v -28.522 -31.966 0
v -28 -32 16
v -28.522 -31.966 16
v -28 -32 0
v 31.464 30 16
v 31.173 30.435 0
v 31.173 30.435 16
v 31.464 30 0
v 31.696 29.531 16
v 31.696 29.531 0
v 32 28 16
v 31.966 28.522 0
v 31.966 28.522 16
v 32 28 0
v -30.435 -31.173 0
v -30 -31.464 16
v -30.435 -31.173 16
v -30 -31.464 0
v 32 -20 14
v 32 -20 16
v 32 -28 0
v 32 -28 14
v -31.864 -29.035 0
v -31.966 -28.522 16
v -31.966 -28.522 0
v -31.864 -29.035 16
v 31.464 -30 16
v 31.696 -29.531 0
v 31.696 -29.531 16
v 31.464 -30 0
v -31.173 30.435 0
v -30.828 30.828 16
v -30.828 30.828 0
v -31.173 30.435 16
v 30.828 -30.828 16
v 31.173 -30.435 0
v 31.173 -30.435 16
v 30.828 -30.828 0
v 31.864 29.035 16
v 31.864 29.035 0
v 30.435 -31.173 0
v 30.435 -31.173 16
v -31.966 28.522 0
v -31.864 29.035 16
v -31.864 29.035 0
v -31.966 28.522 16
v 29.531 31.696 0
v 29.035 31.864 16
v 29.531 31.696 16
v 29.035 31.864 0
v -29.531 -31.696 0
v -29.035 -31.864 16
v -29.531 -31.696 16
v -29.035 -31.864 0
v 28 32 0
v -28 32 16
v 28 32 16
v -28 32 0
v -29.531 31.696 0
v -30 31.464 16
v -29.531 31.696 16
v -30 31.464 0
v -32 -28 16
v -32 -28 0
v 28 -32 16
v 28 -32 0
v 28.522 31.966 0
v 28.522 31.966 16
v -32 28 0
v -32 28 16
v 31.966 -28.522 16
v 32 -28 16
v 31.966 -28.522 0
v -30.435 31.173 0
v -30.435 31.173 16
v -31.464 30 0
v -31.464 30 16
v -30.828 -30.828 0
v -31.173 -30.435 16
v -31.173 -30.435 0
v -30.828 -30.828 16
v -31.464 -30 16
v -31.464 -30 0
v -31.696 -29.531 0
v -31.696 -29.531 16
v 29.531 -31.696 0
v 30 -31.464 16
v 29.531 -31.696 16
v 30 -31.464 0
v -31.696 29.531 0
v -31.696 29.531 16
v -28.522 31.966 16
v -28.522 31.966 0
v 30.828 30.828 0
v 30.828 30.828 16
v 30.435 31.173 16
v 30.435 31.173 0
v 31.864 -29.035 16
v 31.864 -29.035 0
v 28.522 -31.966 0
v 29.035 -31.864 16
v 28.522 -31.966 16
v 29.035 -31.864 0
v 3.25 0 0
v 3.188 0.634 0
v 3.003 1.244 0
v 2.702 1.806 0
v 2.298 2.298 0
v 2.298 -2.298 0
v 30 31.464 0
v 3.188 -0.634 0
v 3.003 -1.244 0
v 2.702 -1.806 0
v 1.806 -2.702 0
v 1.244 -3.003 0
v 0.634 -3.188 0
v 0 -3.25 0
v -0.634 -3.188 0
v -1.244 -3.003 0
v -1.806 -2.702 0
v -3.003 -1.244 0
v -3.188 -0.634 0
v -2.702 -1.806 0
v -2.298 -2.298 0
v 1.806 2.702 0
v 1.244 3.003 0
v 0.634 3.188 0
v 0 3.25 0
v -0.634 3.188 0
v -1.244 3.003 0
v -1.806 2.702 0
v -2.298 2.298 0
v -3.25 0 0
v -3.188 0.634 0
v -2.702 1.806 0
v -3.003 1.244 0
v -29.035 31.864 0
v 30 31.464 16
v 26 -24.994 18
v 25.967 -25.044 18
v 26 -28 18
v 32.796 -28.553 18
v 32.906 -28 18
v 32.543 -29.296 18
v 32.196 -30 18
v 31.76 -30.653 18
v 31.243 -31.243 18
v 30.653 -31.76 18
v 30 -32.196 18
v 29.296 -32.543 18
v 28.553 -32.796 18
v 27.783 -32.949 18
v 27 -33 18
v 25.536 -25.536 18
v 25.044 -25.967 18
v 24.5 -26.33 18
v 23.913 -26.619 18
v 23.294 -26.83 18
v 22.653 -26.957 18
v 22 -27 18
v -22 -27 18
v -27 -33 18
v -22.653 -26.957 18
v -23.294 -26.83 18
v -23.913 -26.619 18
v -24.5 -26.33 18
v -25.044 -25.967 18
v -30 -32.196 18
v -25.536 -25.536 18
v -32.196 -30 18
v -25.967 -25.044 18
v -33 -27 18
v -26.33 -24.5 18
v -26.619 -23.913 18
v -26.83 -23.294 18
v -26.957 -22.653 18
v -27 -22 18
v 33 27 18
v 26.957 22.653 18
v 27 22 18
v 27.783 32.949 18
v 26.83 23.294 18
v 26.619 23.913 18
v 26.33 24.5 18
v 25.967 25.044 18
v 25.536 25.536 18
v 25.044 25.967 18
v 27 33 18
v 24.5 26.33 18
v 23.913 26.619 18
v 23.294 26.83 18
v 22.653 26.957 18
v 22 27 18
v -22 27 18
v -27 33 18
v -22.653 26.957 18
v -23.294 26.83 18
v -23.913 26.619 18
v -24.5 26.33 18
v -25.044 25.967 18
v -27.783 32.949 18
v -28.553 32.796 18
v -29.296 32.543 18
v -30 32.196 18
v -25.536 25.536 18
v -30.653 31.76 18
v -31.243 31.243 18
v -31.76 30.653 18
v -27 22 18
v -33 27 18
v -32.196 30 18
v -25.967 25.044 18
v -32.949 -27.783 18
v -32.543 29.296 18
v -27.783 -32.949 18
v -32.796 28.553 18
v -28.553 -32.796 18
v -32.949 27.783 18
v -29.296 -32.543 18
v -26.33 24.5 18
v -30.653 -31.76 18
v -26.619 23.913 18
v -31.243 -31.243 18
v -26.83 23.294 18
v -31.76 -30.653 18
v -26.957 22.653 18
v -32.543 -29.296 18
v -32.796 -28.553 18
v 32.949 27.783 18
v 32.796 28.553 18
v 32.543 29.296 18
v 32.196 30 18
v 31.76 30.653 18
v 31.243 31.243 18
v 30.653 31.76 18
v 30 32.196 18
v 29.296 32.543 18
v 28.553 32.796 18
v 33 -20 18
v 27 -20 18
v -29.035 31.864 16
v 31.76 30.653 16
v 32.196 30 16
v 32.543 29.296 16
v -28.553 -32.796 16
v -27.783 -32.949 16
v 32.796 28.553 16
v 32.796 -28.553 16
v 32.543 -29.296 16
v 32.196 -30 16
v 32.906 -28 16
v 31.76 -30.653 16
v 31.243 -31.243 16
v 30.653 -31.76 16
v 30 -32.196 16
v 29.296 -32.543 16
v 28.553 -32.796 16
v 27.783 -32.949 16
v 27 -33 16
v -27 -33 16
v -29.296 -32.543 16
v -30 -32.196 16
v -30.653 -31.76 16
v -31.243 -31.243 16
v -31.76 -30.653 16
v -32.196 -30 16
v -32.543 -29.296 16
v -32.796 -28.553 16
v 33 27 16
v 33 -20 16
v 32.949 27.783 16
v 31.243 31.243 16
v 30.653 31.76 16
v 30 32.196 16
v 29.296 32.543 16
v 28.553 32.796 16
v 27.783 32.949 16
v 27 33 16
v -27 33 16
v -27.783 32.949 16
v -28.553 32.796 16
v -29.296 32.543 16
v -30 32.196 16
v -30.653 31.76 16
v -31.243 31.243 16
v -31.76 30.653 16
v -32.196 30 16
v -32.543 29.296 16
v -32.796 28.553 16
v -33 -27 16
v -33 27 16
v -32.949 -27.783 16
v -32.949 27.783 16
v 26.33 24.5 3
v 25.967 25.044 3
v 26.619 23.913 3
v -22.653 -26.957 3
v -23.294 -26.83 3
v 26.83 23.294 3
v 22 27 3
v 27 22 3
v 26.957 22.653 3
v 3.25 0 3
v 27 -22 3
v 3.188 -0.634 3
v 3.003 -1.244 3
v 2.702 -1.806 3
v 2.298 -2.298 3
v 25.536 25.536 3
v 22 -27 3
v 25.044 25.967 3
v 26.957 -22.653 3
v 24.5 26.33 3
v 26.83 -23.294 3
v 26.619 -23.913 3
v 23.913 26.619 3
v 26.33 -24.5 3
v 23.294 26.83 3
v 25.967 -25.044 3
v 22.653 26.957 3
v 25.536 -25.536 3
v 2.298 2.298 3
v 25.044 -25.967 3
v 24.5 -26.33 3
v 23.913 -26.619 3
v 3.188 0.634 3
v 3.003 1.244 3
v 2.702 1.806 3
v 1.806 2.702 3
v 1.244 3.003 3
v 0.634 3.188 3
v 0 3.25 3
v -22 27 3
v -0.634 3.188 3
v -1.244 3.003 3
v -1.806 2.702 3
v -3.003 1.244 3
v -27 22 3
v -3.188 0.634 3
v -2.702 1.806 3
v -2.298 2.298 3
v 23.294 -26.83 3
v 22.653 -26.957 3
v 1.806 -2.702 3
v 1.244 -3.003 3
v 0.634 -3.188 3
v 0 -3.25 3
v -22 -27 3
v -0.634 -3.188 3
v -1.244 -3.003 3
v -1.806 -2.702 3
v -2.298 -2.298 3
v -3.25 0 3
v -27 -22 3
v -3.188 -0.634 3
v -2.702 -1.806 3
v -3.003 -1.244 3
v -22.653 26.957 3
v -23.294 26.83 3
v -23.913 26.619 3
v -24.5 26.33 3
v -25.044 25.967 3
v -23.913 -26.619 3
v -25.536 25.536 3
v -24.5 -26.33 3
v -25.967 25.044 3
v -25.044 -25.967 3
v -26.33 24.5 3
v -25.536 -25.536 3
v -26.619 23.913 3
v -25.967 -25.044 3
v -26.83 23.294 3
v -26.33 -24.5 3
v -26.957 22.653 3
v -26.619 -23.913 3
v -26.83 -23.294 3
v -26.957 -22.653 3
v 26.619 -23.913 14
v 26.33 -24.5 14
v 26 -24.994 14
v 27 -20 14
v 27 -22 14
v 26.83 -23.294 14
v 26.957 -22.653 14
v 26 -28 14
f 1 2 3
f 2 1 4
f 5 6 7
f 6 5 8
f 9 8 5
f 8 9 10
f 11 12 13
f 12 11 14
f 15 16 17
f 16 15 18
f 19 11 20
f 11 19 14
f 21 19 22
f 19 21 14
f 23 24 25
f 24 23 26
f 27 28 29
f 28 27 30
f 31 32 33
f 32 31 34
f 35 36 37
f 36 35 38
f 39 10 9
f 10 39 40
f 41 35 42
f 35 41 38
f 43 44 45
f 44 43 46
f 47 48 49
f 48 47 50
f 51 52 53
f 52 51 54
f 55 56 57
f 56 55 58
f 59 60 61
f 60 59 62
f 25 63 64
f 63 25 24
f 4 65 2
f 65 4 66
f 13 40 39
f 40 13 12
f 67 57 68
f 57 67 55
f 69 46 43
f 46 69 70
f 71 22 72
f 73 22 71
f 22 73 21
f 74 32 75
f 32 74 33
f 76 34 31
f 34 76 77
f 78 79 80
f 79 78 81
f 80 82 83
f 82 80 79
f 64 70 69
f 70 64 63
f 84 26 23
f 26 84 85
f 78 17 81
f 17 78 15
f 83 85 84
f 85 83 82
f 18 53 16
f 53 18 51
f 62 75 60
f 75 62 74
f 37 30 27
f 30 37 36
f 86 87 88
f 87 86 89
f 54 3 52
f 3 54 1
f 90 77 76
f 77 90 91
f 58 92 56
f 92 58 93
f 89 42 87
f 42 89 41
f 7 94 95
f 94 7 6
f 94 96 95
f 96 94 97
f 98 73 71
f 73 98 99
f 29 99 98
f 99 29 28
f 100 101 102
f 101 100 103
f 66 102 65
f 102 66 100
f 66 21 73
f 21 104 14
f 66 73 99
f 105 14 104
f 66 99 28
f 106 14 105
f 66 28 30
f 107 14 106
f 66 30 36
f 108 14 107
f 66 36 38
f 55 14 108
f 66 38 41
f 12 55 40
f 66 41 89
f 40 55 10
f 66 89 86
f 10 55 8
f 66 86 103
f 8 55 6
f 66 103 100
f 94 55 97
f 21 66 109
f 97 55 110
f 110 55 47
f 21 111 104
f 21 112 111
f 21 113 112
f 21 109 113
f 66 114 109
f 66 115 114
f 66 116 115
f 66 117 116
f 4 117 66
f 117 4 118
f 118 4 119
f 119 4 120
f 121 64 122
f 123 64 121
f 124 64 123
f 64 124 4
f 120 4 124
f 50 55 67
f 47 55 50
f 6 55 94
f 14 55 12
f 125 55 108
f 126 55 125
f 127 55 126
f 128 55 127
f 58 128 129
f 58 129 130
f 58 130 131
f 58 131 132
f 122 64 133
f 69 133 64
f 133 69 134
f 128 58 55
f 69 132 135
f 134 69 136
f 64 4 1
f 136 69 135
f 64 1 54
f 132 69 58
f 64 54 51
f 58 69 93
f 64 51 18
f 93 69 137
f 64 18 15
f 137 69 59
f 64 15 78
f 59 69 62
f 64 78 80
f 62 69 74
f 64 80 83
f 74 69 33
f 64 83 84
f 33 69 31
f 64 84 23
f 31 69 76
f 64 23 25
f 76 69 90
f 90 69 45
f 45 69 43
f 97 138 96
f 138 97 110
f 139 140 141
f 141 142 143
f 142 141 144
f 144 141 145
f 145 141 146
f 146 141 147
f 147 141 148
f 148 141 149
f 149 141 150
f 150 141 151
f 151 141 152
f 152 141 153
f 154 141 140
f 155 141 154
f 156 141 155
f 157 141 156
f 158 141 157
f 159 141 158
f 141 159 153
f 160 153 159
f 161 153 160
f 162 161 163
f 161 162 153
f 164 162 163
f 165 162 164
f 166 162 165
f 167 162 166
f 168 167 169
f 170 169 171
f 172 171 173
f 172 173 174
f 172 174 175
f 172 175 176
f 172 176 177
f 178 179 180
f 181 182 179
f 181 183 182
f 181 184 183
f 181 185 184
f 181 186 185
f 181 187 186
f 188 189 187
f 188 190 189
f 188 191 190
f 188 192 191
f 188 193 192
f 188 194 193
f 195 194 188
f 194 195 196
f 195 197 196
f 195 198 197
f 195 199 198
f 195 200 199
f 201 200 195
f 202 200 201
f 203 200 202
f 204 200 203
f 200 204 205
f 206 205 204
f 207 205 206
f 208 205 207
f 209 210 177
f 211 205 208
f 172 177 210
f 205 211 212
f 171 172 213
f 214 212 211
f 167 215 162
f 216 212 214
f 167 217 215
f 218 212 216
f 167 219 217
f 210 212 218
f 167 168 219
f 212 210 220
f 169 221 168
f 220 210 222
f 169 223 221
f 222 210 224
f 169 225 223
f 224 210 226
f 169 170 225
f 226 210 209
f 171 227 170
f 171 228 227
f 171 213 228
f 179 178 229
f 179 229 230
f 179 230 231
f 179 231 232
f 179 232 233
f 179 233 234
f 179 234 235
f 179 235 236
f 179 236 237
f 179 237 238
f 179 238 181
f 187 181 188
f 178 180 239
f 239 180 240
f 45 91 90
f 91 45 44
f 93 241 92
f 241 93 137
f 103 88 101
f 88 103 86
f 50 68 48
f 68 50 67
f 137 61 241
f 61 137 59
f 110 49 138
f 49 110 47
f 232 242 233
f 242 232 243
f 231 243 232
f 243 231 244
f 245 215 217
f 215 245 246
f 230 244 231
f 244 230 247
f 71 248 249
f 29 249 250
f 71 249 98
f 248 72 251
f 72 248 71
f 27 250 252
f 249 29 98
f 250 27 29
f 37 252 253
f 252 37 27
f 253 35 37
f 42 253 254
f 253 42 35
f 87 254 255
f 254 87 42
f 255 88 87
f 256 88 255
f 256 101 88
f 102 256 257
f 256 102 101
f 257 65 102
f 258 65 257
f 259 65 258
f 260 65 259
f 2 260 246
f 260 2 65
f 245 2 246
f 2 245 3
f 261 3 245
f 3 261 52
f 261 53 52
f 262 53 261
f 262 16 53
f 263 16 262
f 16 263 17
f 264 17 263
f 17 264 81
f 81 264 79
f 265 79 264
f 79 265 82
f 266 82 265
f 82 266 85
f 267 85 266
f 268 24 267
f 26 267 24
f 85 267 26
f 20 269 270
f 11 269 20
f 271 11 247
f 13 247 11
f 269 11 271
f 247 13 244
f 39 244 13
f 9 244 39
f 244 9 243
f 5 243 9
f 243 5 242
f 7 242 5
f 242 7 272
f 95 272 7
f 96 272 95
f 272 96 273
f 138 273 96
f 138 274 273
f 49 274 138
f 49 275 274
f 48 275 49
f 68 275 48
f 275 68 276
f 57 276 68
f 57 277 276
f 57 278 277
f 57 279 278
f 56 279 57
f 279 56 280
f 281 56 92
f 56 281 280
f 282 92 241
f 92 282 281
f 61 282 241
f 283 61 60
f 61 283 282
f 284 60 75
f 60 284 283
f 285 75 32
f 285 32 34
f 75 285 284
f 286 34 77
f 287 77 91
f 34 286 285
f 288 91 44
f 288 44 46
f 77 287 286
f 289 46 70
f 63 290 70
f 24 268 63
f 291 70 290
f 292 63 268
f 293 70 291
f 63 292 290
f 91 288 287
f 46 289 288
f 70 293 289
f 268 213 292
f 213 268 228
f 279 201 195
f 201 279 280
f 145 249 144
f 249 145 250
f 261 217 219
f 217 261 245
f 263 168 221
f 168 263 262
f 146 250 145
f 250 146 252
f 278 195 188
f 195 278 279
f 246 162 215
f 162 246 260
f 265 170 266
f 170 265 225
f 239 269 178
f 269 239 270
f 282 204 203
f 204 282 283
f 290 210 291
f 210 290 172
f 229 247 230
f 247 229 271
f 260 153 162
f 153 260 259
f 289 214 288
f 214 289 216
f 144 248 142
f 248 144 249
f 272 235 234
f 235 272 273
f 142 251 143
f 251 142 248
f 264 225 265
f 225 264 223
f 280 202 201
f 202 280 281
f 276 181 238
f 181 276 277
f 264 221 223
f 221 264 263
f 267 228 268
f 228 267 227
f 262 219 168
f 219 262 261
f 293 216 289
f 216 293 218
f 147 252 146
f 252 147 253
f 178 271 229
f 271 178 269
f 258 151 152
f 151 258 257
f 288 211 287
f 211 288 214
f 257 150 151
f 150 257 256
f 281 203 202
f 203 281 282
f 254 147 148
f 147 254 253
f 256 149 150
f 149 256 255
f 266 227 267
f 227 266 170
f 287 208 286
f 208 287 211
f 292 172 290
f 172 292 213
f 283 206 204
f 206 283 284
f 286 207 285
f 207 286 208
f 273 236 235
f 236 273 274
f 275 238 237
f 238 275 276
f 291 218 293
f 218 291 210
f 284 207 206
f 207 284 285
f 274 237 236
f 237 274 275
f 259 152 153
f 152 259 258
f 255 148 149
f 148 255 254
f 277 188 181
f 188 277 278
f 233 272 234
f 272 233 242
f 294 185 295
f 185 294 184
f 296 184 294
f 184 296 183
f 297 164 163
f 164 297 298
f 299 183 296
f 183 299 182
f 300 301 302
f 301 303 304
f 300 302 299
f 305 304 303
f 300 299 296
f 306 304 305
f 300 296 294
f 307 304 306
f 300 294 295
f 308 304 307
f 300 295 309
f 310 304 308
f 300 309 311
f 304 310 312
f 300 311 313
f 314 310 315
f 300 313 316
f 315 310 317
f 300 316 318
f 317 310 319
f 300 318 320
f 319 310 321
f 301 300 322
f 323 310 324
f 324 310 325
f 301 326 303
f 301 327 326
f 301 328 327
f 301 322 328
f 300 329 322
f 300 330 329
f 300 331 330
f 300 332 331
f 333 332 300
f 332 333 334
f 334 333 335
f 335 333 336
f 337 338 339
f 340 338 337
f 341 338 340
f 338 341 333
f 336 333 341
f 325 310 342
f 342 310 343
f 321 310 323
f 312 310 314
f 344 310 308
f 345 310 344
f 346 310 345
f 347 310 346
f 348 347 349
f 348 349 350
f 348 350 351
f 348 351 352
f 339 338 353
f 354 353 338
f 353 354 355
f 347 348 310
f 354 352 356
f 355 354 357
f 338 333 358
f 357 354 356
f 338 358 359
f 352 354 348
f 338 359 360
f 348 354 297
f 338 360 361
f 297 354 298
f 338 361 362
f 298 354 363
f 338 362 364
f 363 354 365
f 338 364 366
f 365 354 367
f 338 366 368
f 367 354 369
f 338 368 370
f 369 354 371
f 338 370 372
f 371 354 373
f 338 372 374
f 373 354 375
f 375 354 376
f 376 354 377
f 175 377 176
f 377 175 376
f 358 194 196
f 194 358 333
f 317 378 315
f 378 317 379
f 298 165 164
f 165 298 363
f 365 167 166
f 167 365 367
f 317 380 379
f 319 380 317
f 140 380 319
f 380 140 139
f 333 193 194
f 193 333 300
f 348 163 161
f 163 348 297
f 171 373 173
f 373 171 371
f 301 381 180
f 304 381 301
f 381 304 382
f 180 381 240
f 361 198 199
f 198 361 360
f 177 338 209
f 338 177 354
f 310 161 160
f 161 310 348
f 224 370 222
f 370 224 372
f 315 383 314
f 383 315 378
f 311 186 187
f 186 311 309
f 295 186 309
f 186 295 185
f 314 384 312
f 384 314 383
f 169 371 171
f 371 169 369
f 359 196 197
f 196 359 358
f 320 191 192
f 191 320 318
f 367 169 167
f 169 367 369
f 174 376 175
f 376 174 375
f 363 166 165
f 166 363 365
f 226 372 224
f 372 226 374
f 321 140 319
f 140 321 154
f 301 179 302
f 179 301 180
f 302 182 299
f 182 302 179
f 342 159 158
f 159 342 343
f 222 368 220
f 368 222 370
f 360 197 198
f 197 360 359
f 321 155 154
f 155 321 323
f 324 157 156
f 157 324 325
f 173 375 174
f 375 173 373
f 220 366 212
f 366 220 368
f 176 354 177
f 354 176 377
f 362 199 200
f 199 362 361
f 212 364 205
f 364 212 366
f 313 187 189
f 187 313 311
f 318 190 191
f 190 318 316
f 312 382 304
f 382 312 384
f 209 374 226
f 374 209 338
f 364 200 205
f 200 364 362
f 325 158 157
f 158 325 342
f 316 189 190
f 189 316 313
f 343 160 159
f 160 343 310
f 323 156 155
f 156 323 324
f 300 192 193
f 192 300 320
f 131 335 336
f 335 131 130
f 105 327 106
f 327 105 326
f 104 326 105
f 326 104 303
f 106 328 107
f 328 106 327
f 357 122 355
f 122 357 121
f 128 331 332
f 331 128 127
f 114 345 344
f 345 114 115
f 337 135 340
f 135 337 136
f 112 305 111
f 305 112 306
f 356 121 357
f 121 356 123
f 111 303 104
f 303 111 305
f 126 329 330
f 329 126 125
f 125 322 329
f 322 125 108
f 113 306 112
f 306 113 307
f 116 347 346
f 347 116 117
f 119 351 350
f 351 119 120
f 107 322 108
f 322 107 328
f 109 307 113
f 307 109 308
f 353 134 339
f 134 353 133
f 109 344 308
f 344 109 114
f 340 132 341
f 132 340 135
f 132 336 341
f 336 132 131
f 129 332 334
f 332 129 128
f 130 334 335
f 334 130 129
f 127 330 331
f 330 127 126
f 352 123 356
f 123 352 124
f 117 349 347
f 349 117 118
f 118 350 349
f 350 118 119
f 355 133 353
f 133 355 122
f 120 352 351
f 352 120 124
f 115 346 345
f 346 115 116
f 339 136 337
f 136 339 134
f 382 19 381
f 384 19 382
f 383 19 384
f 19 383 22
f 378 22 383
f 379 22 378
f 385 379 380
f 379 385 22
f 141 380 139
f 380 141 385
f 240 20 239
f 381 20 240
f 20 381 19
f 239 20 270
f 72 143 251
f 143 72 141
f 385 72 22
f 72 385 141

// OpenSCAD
// file: ../params.scad
// LEGACY OpenSCAD — not maintained. Edit design/bed_params.json + Fusion builder instead.

// --- Printer envelope (Bambu P2S) ---
build_max = 256;
print_margin = 4;
print_limit = build_max - print_margin;

// --- Cell grid ---
grid_n = 3;
cell_pitch = 76;
wall_t = 3;
well_open = 58;
flange_seat = 64;
cassette_h = 18;
port_d = 6.5;

// --- Deck structure ---
deck_top_t = 4;
cavity_h = 32; // tube routing under cell deck (not electronics bay)
deck_rim = 8;
corner_r = 6;

// --- 370 micro pump (Taobao kit / photo vs Arduino; see docs/HARDWARE_DIMENSIONS.md) ---
pump_motor_d = 24.5;
pump_head_d = 31;
pump_axis_l = 68;
pump_nozzle_h = 8;
pump_port_od = 4.2;
pump_wire_tail = 35;
pump_count = 8; // set 6–8; layout skips extras above pump_count
pump_rows = 2;
pump_cols = 4;
pump_col_pitch = 36; // center distance along X
pump_row_pitch = 38; // center distance along Y
pump_cradle_z = 2; // floor of cradle above tray surface

// --- Solenoid (kit) ---
valve_l = 22;
valve_w = 12;
valve_h = 30;
valve_count = grid_n * grid_n;

// --- Arduino Uno + sensor shield (kit photo) ---
ctrl_board_l = 69;
ctrl_board_w = 54;
arduino_l = ctrl_board_l;
arduino_w = ctrl_board_w;
arduino_stack_h = 28;
arduino_standoff_h = 6;
arduino_usb_slot_w = 14;
arduino_usb_slot_h = 8;

// --- Closed electronics bay (pumps + Arduino, under service deck) ---
e_bay_x = 200;
e_bay_y = 128;
e_bay_cavity_h = 52;
e_bay_split_x = 100; // optional left/right print split at this X (local)
e_bay_tray_t = 4;
e_bay_rim_h = 8;

// Pump block placement inside bay (local coords, center = origin)
pump_block_w = (pump_cols - 1) * pump_col_pitch + pump_axis_l;
pump_block_h = (pump_rows - 1) * pump_row_pitch + pump_head_d;
pump_block_x0 = -pump_block_w / 2 - 8;
pump_block_y0 = -8;
arduino_pocket_x = e_bay_x / 2 - deck_rim - ctrl_board_l / 2 - 6;
arduino_pocket_y = -e_bay_y / 2 + deck_rim + ctrl_board_w / 2 + 6;

wire_gutter_d = 10;

// --- Service module (solid deck above electronics bay) ---
service_len = e_bay_y + deck_rim * 2;
service_deck_solid = true;

// --- Bottom / screw housing ---
panel_t = 4;
panel_screw_d = 3.4;
panel_screw_pitch = 35;
flange_screw_pitch = 40;
boss_od = 8;
split_flange_t = 10;

// --- Tube routing (cell deck) ---
// Each cell: one tube at bottom-center of well (not visible from top).
tube_od = 6;
tube_clip_id = tube_od + 0.6;
channel_w = tube_od + 4;
channel_depth = 8;
stem_pocket_d = channel_w; // barb + bend relief under well floor
stem_pocket_h = channel_depth + 4;

// --- Joint between deck sections ---
dowel_d = 5;
dowel_depth = 10;
lap_joint_screw_d = 3.4;

slip_fit = 0.25;
eps = 0.01;

function grid_span(n, pitch) = (n - 1) * pitch;
grid_xy = grid_span(grid_n, cell_pitch) + well_open + deck_rim * 2;
deck_cell_x = grid_xy;
deck_cell_y = grid_xy;
deck_service_x = max(deck_cell_x, e_bay_x + deck_rim * 2);
deck_service_y = service_len;
// file: ../lib/util.scad
include <../params.scad>

module rounded_rect_xy(x, y, r) {
  r2 = min(r, x / 2 - eps, y / 2 - eps);
  minkowski() {
    square([x - 2 * r2, y - 2 * r2], center = true);
    circle(r = r2, $fn = 48);
  }
}

module rounded_rect_3d(x, y, z, r) {
  linear_extrude(height = z, center = false, convexity = 4)
    rounded_rect_xy(x, y, r);
}

module well_cut(open_size, depth) {
  linear_extrude(height = depth + eps)
    rounded_rect_xy(open_size, open_size, corner_r - 1);
}

module port_hole(d = port_d) {
  cylinder(h = deck_top_t + cavity_h + panel_t + 2, d = d, center = false, $fn = 32);
}

// Bottom-center of cell well: through 4 mm floor into routing cavity (hidden from top).
module cell_bottom_port() {
  translate([0, 0, -eps])
    cylinder(h = deck_top_t + eps, d = port_d, $fn = 32);
}

module cell_stem_pocket(h = stem_pocket_h, d = stem_pocket_d) {
  translate([0, 0, -deck_top_t])
    cylinder(h = h, d = d, $fn = 32);
}

// Horizontal groove under deck (−Y toward service bay), centered on cell X.
module cell_run_to_service(run_len) {
  if (run_len > 2)
    translate([0, -run_len / 2, -deck_top_t - channel_depth / 2])
      cube([channel_w, run_len, channel_depth], center = true);
}

function service_foot_y(deck_y) = -deck_y / 2 + deck_rim;

function cell_run_len(cell_y, deck_y) = cell_y - service_foot_y(deck_y);

module cell_underdeck_plumbing(cell_y, deck_y) {
  cell_bottom_port();
  cell_stem_pocket();
  cell_run_to_service(cell_run_len(cell_y, deck_y));
}

module dowel_hole(depth = dowel_depth) {
  cylinder(h = depth + eps, d = dowel_d + slip_fit, $fn = 32);
}

module dowel_pin(h = dowel_depth) {
  cylinder(h = h, d = dowel_d - 0.05, $fn = 32);
}

// Route from cell center toward service bay (-Y direction)
module tube_channel(length, w = channel_w, d = channel_depth) {
  translate([0, -length / 2, -d])
    cube([w, length, d], center = true);
}

module tube_clip_body() {
  clip_w = 12;
  clip_h = channel_depth + 4;
  difference() {
    rounded_rect_3d(clip_w, clip_w, clip_h, 2);
    translate([0, 0, 2])
      cylinder(h = clip_h, d = tube_clip_id, $fn = 32);
    // snap slot
    translate([clip_w / 2 - 1, 0, clip_h / 2])
      cube([2, clip_w, clip_h], center = true);
  }
}
// main file
// Export: cell_cassette.stl — print ×9, PETG, top surface down for smooth seat
include <../lib/util.scad>

module cell_cassette() {
  outer = flange_seat;
  inner = well_open - 4;
  wall = (outer - inner) / 2;

  difference() {
    union() {
      rounded_rect_3d(outer, outer, cassette_h, corner_r - 2);
      // clamp lip
      translate([0, 0, cassette_h - 2])
        rounded_rect_3d(outer + 2, outer + 2, 2, corner_r);
    }
    // bladder pocket
    translate([0, 0, 3])
      well_cut(inner, cassette_h + eps);
    // bottom-center barb (mates with deck port; not visible from top)
    translate([0, 0, -eps])
      cylinder(h = wall + 4, d = port_d, $fn = 32);
    // label notch
    translate([outer / 2 - 6, -outer / 2 + 4, cassette_h - 4])
      cube([12, 8, 4], center = false);
  }
}

cell_cassette();
